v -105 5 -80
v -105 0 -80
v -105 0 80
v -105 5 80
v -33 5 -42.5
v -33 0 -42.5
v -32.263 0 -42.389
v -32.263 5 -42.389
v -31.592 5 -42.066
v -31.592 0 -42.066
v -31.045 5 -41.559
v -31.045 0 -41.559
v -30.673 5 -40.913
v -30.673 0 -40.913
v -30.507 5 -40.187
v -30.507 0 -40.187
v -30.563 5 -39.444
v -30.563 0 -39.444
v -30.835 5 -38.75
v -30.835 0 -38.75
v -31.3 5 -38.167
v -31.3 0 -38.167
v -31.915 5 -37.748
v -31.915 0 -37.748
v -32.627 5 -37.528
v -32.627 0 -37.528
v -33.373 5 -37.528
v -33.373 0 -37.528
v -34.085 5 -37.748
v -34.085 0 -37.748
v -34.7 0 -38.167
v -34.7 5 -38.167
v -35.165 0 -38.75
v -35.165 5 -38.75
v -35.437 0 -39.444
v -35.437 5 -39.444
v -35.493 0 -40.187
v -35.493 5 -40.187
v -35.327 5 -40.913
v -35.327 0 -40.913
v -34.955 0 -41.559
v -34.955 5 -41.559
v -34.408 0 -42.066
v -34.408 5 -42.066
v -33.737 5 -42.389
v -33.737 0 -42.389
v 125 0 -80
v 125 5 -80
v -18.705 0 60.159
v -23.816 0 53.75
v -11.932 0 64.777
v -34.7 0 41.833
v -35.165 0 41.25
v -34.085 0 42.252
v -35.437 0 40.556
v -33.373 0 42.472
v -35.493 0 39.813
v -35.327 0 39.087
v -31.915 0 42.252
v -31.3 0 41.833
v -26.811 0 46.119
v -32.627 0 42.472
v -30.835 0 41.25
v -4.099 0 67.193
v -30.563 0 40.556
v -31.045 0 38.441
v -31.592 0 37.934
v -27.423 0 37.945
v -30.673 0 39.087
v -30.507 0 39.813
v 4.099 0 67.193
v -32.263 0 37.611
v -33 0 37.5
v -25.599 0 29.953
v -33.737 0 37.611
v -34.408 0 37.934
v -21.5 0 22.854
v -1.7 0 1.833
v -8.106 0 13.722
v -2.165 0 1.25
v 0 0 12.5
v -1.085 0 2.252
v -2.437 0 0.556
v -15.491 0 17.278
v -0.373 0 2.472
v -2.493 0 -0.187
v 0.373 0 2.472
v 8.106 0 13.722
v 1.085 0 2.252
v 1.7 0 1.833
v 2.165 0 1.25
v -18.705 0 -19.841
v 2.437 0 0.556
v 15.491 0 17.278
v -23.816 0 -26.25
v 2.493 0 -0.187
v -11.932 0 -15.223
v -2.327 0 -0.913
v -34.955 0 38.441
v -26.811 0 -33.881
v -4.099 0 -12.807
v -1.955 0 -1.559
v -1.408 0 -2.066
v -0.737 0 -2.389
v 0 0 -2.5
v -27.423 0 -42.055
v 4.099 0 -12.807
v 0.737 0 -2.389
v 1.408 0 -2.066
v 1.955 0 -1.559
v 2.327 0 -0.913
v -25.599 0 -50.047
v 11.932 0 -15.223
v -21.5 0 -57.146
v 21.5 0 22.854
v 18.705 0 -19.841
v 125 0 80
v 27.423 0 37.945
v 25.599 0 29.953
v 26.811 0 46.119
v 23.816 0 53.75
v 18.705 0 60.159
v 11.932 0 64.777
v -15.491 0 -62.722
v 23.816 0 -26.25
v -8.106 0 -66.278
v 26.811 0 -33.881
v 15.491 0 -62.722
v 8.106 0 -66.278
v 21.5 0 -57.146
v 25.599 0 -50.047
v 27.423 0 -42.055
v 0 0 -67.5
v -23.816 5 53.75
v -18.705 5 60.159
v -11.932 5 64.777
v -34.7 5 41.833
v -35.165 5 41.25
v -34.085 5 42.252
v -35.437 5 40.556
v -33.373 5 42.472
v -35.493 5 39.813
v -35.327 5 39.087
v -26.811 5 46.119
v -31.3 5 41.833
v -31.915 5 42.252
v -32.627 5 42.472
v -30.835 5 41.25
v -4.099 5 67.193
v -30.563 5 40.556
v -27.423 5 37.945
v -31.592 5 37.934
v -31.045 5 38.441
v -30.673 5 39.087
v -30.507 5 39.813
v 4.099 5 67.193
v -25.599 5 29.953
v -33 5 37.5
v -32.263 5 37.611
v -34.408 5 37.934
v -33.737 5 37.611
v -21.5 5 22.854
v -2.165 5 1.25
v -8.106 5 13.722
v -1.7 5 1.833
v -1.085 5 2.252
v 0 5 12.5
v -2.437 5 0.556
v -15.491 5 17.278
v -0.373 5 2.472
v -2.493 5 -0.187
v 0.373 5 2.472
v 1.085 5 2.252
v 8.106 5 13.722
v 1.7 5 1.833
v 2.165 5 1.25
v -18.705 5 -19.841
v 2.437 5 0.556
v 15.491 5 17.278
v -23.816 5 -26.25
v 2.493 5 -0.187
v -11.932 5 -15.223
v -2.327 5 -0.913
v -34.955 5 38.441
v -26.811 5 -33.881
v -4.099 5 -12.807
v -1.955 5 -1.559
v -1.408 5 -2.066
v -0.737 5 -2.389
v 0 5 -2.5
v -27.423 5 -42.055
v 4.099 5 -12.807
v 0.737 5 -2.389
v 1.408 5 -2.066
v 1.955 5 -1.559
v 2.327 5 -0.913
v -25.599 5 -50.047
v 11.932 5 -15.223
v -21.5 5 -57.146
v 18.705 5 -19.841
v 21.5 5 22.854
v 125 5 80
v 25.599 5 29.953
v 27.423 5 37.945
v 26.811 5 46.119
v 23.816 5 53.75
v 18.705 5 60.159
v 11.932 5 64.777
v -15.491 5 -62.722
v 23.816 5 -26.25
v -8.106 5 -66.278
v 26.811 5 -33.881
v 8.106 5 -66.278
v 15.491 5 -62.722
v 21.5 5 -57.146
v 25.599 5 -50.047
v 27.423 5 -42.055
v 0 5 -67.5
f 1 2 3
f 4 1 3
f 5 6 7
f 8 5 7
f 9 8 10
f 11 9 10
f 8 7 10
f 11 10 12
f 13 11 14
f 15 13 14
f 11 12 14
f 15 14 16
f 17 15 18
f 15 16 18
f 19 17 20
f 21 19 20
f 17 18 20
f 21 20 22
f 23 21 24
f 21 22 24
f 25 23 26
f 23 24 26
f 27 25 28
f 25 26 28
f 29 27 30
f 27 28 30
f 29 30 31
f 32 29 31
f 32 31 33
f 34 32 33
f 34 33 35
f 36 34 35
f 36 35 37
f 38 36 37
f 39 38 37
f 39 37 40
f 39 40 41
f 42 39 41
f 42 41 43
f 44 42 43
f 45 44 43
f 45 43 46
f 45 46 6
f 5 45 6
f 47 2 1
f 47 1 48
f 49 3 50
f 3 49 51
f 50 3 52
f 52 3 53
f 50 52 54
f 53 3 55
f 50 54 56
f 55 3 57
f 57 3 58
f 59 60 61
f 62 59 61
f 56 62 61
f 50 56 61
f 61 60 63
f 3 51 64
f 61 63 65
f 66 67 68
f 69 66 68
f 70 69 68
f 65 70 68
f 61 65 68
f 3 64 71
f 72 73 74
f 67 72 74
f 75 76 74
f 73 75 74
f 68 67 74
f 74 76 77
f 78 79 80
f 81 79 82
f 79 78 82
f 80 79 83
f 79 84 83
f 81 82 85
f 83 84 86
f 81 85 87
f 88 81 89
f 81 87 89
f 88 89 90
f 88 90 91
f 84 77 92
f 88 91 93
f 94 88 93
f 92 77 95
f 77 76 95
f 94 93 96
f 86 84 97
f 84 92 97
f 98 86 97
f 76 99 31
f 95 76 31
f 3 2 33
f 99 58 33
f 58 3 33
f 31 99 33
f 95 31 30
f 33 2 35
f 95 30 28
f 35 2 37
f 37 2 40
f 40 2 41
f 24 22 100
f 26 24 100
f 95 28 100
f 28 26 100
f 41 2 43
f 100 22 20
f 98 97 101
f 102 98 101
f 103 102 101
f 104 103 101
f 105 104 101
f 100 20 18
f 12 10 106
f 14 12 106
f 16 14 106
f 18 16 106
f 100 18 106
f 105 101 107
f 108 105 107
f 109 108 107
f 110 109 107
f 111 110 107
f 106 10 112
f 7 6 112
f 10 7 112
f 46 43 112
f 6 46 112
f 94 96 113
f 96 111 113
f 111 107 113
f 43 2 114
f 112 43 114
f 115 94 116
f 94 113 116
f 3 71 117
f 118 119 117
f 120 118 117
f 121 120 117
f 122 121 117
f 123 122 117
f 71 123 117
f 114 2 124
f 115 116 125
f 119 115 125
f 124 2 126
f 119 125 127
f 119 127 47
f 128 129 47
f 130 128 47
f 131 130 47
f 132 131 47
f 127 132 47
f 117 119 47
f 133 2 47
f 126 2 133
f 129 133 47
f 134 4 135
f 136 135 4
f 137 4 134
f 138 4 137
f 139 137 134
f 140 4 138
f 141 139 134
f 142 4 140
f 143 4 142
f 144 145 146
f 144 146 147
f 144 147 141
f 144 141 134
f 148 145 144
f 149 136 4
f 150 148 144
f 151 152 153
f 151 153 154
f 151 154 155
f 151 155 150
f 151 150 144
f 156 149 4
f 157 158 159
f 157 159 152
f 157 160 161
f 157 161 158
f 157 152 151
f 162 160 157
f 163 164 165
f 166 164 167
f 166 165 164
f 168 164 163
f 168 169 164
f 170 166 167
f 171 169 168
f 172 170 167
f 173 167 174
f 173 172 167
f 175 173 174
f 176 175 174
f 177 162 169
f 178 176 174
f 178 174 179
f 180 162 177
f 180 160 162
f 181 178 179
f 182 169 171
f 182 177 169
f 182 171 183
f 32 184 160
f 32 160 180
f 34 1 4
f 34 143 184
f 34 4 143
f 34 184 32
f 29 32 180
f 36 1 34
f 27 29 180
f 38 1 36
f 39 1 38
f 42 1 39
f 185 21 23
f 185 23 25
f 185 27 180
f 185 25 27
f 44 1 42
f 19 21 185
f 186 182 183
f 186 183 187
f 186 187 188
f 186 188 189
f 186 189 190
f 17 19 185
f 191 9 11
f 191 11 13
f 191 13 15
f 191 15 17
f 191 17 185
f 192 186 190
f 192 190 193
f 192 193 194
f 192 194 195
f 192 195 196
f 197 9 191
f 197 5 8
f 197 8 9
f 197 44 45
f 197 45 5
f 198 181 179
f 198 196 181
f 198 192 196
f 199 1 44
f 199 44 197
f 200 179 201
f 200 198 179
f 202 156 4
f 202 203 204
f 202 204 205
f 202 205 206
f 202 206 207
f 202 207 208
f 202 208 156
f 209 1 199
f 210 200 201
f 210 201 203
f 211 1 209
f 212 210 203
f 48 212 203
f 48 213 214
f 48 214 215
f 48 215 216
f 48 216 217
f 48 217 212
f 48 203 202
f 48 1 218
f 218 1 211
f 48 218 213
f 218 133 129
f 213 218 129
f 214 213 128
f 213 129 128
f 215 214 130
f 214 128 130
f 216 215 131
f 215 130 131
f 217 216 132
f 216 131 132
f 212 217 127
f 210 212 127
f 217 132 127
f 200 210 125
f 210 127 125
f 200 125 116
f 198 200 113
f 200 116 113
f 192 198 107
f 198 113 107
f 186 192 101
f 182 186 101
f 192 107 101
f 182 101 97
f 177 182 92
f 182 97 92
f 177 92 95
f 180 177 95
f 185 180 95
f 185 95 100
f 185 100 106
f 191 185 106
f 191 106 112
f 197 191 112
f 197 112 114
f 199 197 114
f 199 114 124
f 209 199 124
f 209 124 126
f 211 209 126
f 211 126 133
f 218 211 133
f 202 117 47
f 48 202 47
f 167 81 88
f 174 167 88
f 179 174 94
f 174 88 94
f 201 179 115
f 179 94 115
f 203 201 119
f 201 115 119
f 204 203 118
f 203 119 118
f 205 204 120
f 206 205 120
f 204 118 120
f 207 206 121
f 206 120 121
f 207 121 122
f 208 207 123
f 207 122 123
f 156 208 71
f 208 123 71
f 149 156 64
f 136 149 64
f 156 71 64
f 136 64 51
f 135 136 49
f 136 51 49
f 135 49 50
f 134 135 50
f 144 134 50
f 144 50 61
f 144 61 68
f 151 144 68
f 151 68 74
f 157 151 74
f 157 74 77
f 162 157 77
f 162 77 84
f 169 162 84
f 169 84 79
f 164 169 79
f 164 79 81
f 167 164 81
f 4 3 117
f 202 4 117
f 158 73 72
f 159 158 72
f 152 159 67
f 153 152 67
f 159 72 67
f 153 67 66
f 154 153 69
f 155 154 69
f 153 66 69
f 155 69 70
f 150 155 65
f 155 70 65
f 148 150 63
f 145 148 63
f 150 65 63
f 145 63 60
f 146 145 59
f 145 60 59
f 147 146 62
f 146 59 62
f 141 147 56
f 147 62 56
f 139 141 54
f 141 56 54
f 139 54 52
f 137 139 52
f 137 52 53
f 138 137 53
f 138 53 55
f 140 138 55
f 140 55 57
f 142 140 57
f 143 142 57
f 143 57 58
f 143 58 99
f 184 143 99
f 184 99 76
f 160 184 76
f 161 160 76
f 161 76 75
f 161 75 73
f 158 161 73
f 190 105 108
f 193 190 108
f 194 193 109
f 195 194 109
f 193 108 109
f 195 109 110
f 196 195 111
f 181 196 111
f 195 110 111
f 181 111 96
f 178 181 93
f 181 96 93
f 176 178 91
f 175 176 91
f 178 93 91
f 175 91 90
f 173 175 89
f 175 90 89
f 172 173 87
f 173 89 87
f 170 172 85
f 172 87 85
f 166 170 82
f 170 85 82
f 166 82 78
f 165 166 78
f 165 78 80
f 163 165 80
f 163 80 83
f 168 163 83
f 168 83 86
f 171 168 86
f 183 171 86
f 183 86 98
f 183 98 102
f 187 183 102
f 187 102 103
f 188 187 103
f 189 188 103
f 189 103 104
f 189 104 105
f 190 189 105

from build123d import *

# Parameters (mm, degrees)
SKETCH_1_W          = 250
SKETCH_1_H          = 160
EXTRUDE_1_DEPTH     = 5
CUT_EXTRUDE_1_REACH = 150.492
SKETCH_2_R          = 27.5
SKETCH_2_R_2        = 2.5
SKETCH_2_W          = 40
SKETCH_2_H          = 160


with BuildPart() as part:
    # 草图1 → 凸台-拉伸1 (new body)
    with BuildSketch(Plane(origin=(0, 0, 0), x_dir=(1, 0, 0), z_dir=(0, 1, 0))):
        Rectangle(SKETCH_1_W, SKETCH_1_H)
    extrude(amount=EXTRUDE_1_DEPTH)

    # 草图2 → 切除-拉伸1 (cut, up to next)
    with BuildSketch(Plane.XZ, mode=Mode.PRIVATE) as cut_extrude_1_sk1:
        with Locations(Location((0, -40, 0), (0, 0, 270))):
            Circle(SKETCH_2_R)
    cut_extrude_1_tool1 = extrude(cut_extrude_1_sk1.sketch, amount=-CUT_EXTRUDE_1_REACH, mode=Mode.PRIVATE) & part.part
    # 草图2 → 切除-拉伸1 (cut, up to next)
    with BuildSketch(Plane.XZ, mode=Mode.PRIVATE) as cut_extrude_1_sk2:
        with Locations(Location((-33, -40, 0), (0, 0, 270))):
            Circle(SKETCH_2_R_2)
    cut_extrude_1_tool2 = extrude(cut_extrude_1_sk2.sketch, amount=-CUT_EXTRUDE_1_REACH, mode=Mode.PRIVATE) & part.part
    # 草图2 → 切除-拉伸1 (cut, up to next)
    with BuildSketch(Plane.XZ, mode=Mode.PRIVATE) as cut_extrude_1_sk3:
        with Locations(Location((-33, 40, 0), (0, 0, 270))):
            Circle(SKETCH_2_R_2)
    cut_extrude_1_tool3 = extrude(cut_extrude_1_sk3.sketch, amount=-CUT_EXTRUDE_1_REACH, mode=Mode.PRIVATE) & part.part
    # 草图2 → 切除-拉伸1 (cut, up to next)
    with BuildSketch(Plane.XZ, mode=Mode.PRIVATE) as cut_extrude_1_sk4:
        with Locations(Location((0, 40, 0), (0, 0, 270))):
            Circle(SKETCH_2_R)
    cut_extrude_1_tool4 = extrude(cut_extrude_1_sk4.sketch, amount=-CUT_EXTRUDE_1_REACH, mode=Mode.PRIVATE) & part.part
    # 草图2 → 切除-拉伸1 (cut, up to next)
    with BuildSketch(Plane.XZ, mode=Mode.PRIVATE) as cut_extrude_1_sk5:
        with Locations(Location((0, 0, 0), (0, 0, 270))):
            Circle(SKETCH_2_R_2)
    cut_extrude_1_tool5 = extrude(cut_extrude_1_sk5.sketch, amount=-CUT_EXTRUDE_1_REACH, mode=Mode.PRIVATE) & part.part
    # 草图2 → 切除-拉伸1 (cut, up to next)
    with BuildSketch(Plane.XZ, mode=Mode.PRIVATE) as cut_extrude_1_sk6:
        with Locations((-125, 0)):
            Rectangle(SKETCH_2_W, SKETCH_2_H)
    cut_extrude_1_tool6 = extrude(cut_extrude_1_sk6.sketch, amount=-CUT_EXTRUDE_1_REACH, mode=Mode.PRIVATE) & part.part
    add(cut_extrude_1_tool1.solids().sort_by_distance((0, 0, -40))[0], mode=Mode.SUBTRACT)
    add(cut_extrude_1_tool2.solids().sort_by_distance((-33, 0, -40))[0], mode=Mode.SUBTRACT)
    add(cut_extrude_1_tool3.solids().sort_by_distance((-33, 0, 40))[0], mode=Mode.SUBTRACT)
    add(cut_extrude_1_tool4.solids().sort_by_distance((0, 0, 40))[0], mode=Mode.SUBTRACT)
    add(cut_extrude_1_tool5.solids().sort_by_distance((0, 0, 0))[0], mode=Mode.SUBTRACT)
    add(cut_extrude_1_tool6.solids().sort_by_distance((-125, 0, 0))[0], mode=Mode.SUBTRACT)


solid = part.part
